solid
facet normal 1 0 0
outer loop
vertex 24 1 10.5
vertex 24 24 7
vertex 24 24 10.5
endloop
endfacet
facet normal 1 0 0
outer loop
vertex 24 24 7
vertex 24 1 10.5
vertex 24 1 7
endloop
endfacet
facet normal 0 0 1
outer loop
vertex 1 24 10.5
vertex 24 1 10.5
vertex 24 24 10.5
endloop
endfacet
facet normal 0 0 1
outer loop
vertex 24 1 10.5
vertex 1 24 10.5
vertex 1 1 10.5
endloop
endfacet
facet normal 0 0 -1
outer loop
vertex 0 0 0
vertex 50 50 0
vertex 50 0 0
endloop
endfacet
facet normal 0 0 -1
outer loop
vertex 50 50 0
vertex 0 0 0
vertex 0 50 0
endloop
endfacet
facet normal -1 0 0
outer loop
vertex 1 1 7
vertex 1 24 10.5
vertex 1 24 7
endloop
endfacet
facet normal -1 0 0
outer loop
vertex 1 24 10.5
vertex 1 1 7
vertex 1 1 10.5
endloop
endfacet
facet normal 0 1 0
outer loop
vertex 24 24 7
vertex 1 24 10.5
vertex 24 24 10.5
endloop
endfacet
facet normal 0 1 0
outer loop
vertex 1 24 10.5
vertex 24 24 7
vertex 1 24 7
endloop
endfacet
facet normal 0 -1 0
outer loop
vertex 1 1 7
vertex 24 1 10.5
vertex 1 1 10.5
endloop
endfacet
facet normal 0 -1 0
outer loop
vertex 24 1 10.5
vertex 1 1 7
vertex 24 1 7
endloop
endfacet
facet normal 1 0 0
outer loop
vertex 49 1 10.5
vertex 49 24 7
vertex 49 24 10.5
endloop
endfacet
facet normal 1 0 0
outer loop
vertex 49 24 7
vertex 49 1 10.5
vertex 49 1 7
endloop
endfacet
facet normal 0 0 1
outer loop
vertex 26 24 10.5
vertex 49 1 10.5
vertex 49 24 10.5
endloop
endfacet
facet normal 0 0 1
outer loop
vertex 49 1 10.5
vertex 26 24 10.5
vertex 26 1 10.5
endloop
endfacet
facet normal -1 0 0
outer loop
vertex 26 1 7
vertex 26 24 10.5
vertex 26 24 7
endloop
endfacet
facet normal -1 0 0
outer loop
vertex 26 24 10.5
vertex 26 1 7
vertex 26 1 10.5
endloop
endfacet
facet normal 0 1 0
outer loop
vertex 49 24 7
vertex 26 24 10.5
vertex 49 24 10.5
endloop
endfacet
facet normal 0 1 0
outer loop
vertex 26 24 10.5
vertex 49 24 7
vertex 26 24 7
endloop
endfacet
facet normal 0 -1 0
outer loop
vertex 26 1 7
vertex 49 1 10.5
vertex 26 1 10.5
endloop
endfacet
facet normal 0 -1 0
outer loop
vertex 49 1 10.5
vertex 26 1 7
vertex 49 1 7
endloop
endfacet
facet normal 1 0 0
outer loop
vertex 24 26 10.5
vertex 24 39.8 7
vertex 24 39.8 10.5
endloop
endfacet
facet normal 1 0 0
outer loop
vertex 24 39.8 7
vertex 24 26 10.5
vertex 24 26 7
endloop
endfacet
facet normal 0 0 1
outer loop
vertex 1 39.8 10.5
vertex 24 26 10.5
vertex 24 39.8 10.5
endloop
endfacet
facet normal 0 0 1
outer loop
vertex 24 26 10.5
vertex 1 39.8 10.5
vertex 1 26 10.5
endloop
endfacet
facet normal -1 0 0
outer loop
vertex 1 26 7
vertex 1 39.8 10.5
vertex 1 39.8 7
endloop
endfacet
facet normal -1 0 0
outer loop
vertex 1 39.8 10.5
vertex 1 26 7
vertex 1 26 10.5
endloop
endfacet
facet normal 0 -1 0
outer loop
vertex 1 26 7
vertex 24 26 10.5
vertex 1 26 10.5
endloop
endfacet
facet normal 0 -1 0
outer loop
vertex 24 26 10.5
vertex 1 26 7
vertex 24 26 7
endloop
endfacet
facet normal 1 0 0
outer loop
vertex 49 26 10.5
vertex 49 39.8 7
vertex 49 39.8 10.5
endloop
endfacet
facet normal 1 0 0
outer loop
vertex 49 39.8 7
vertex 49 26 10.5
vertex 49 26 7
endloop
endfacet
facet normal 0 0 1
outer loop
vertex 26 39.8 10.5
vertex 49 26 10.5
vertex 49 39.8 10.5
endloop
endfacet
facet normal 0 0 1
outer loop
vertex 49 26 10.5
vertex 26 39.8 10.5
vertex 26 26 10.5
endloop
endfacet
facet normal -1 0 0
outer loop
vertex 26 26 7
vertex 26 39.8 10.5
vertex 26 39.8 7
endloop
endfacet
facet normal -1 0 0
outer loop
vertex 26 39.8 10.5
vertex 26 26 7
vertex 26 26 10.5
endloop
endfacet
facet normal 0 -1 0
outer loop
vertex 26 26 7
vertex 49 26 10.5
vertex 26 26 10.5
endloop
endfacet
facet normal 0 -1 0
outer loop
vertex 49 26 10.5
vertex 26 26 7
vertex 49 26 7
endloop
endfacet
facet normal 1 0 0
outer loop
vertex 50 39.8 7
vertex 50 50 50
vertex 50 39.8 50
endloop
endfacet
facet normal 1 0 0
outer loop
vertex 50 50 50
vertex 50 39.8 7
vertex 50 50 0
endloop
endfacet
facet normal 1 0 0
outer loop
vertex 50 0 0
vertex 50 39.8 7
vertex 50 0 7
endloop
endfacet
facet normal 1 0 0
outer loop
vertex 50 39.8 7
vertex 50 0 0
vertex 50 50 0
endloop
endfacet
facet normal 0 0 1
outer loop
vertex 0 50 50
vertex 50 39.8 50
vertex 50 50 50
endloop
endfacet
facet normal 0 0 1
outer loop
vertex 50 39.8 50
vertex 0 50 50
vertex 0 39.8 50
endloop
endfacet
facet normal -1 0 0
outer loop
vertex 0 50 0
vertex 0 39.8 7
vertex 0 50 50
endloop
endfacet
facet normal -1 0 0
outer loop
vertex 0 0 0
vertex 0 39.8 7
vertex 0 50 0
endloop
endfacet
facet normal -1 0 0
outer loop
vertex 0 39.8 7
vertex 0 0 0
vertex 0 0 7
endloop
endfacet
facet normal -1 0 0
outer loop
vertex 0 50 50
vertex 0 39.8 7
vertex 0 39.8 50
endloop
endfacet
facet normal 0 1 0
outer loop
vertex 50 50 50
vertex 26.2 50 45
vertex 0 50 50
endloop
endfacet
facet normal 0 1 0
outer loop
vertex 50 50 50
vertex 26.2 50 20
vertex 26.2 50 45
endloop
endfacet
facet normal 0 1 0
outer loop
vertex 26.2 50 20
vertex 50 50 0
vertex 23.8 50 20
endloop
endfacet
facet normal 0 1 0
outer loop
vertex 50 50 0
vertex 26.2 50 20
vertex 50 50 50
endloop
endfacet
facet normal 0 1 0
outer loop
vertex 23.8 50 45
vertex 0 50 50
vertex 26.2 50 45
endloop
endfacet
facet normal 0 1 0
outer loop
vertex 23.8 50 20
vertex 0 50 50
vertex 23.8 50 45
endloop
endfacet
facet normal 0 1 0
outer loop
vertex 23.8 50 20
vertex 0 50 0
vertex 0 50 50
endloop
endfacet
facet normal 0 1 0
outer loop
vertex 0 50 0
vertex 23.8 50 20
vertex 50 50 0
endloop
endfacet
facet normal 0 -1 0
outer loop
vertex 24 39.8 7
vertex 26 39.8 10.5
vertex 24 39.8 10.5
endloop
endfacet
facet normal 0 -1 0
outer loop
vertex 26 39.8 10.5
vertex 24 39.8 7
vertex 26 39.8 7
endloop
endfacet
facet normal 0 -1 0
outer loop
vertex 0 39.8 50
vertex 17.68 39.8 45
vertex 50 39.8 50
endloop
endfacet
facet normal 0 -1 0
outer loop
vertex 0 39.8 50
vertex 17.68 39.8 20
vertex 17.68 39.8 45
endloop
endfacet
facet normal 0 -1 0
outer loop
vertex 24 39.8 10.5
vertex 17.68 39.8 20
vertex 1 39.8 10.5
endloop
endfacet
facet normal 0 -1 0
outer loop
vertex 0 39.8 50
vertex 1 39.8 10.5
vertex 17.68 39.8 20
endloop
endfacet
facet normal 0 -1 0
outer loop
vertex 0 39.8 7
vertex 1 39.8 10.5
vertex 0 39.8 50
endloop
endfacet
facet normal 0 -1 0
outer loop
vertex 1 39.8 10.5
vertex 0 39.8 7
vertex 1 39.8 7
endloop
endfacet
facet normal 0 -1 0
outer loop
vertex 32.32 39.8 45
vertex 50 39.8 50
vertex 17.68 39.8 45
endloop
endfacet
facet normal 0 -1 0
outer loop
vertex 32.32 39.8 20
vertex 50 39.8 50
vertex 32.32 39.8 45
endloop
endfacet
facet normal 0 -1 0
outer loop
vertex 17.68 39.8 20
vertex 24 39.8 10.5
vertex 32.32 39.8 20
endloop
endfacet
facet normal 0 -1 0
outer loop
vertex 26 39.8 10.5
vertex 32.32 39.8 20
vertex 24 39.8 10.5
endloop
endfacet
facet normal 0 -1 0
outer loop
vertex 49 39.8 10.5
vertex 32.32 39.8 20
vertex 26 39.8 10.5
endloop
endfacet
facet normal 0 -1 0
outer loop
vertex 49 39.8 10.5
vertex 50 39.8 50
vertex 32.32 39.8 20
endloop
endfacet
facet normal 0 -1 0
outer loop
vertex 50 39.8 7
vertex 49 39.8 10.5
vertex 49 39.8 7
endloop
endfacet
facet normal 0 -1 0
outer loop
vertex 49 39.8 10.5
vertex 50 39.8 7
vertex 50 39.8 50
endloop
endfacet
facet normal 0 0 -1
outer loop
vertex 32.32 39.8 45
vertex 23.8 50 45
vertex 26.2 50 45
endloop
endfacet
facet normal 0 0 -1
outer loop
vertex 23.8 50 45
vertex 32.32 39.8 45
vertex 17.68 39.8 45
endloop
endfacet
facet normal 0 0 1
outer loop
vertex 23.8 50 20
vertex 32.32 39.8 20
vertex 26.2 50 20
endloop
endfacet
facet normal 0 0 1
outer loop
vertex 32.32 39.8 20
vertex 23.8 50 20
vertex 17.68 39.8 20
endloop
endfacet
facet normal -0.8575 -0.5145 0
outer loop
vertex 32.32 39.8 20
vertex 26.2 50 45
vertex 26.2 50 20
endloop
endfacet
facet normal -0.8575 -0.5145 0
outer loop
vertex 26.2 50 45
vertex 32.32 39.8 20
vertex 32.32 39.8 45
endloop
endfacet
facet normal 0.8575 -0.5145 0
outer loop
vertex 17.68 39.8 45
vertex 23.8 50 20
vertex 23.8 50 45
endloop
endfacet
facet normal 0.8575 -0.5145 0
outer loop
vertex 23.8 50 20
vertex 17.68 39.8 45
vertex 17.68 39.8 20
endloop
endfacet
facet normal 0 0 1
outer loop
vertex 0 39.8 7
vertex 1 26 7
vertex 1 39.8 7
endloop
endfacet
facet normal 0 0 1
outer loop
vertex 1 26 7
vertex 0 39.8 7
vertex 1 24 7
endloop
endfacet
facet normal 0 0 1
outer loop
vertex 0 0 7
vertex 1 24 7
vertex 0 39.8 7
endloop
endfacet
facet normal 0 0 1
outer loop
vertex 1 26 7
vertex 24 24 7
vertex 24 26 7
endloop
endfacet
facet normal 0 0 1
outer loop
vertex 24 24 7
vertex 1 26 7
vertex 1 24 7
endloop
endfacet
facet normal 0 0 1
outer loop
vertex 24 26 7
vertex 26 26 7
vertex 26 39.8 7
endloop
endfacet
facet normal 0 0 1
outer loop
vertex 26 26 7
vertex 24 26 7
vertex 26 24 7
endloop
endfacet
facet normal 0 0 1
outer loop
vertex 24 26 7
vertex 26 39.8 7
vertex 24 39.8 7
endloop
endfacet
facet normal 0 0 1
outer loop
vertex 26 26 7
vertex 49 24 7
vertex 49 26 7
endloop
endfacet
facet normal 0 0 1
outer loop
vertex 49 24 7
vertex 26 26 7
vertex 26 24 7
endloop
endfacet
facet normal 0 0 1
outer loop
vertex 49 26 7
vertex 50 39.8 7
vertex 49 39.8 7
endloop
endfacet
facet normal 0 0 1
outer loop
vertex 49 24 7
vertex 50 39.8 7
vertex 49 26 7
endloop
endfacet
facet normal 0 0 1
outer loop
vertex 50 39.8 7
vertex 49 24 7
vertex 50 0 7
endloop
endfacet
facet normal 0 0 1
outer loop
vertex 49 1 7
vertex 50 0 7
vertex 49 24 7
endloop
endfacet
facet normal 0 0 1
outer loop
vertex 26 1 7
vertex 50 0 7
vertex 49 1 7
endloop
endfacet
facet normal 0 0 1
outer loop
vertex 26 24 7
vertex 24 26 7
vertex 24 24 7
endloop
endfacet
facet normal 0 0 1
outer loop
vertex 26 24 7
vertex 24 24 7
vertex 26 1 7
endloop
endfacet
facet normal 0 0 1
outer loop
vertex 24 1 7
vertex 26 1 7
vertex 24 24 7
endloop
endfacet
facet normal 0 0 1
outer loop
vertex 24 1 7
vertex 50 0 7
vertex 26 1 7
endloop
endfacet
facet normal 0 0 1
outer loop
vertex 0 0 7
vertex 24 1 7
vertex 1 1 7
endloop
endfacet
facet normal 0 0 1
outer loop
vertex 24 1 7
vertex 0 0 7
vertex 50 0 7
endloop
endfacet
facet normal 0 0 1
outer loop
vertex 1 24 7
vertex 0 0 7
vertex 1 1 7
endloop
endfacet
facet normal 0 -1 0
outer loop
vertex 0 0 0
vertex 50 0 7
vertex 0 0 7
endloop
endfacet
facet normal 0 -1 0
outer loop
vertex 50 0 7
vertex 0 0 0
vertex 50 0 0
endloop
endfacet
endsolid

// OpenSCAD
color("LightGray") {
    translate([1,1,0]) cube([23,23,6+4.5]);
    translate([25+1,1,0]) cube([23,23,6+4.5]);
    translate([1,25+1,0]) cube([23,23,6+4.5]);
    translate([25+1,25+1,0]) cube([23,23,6+4.5]);
}
color("Grey") {
    cube([50,50,6+1]);
    difference() {
        translate([0,50-10.2,0]) cube([50,10.2,50]);
        translate([25,52,20]) scale([.6,1,1]) rotate([0,0,180+45]) cube([20,20,25]);
        
    }
}
